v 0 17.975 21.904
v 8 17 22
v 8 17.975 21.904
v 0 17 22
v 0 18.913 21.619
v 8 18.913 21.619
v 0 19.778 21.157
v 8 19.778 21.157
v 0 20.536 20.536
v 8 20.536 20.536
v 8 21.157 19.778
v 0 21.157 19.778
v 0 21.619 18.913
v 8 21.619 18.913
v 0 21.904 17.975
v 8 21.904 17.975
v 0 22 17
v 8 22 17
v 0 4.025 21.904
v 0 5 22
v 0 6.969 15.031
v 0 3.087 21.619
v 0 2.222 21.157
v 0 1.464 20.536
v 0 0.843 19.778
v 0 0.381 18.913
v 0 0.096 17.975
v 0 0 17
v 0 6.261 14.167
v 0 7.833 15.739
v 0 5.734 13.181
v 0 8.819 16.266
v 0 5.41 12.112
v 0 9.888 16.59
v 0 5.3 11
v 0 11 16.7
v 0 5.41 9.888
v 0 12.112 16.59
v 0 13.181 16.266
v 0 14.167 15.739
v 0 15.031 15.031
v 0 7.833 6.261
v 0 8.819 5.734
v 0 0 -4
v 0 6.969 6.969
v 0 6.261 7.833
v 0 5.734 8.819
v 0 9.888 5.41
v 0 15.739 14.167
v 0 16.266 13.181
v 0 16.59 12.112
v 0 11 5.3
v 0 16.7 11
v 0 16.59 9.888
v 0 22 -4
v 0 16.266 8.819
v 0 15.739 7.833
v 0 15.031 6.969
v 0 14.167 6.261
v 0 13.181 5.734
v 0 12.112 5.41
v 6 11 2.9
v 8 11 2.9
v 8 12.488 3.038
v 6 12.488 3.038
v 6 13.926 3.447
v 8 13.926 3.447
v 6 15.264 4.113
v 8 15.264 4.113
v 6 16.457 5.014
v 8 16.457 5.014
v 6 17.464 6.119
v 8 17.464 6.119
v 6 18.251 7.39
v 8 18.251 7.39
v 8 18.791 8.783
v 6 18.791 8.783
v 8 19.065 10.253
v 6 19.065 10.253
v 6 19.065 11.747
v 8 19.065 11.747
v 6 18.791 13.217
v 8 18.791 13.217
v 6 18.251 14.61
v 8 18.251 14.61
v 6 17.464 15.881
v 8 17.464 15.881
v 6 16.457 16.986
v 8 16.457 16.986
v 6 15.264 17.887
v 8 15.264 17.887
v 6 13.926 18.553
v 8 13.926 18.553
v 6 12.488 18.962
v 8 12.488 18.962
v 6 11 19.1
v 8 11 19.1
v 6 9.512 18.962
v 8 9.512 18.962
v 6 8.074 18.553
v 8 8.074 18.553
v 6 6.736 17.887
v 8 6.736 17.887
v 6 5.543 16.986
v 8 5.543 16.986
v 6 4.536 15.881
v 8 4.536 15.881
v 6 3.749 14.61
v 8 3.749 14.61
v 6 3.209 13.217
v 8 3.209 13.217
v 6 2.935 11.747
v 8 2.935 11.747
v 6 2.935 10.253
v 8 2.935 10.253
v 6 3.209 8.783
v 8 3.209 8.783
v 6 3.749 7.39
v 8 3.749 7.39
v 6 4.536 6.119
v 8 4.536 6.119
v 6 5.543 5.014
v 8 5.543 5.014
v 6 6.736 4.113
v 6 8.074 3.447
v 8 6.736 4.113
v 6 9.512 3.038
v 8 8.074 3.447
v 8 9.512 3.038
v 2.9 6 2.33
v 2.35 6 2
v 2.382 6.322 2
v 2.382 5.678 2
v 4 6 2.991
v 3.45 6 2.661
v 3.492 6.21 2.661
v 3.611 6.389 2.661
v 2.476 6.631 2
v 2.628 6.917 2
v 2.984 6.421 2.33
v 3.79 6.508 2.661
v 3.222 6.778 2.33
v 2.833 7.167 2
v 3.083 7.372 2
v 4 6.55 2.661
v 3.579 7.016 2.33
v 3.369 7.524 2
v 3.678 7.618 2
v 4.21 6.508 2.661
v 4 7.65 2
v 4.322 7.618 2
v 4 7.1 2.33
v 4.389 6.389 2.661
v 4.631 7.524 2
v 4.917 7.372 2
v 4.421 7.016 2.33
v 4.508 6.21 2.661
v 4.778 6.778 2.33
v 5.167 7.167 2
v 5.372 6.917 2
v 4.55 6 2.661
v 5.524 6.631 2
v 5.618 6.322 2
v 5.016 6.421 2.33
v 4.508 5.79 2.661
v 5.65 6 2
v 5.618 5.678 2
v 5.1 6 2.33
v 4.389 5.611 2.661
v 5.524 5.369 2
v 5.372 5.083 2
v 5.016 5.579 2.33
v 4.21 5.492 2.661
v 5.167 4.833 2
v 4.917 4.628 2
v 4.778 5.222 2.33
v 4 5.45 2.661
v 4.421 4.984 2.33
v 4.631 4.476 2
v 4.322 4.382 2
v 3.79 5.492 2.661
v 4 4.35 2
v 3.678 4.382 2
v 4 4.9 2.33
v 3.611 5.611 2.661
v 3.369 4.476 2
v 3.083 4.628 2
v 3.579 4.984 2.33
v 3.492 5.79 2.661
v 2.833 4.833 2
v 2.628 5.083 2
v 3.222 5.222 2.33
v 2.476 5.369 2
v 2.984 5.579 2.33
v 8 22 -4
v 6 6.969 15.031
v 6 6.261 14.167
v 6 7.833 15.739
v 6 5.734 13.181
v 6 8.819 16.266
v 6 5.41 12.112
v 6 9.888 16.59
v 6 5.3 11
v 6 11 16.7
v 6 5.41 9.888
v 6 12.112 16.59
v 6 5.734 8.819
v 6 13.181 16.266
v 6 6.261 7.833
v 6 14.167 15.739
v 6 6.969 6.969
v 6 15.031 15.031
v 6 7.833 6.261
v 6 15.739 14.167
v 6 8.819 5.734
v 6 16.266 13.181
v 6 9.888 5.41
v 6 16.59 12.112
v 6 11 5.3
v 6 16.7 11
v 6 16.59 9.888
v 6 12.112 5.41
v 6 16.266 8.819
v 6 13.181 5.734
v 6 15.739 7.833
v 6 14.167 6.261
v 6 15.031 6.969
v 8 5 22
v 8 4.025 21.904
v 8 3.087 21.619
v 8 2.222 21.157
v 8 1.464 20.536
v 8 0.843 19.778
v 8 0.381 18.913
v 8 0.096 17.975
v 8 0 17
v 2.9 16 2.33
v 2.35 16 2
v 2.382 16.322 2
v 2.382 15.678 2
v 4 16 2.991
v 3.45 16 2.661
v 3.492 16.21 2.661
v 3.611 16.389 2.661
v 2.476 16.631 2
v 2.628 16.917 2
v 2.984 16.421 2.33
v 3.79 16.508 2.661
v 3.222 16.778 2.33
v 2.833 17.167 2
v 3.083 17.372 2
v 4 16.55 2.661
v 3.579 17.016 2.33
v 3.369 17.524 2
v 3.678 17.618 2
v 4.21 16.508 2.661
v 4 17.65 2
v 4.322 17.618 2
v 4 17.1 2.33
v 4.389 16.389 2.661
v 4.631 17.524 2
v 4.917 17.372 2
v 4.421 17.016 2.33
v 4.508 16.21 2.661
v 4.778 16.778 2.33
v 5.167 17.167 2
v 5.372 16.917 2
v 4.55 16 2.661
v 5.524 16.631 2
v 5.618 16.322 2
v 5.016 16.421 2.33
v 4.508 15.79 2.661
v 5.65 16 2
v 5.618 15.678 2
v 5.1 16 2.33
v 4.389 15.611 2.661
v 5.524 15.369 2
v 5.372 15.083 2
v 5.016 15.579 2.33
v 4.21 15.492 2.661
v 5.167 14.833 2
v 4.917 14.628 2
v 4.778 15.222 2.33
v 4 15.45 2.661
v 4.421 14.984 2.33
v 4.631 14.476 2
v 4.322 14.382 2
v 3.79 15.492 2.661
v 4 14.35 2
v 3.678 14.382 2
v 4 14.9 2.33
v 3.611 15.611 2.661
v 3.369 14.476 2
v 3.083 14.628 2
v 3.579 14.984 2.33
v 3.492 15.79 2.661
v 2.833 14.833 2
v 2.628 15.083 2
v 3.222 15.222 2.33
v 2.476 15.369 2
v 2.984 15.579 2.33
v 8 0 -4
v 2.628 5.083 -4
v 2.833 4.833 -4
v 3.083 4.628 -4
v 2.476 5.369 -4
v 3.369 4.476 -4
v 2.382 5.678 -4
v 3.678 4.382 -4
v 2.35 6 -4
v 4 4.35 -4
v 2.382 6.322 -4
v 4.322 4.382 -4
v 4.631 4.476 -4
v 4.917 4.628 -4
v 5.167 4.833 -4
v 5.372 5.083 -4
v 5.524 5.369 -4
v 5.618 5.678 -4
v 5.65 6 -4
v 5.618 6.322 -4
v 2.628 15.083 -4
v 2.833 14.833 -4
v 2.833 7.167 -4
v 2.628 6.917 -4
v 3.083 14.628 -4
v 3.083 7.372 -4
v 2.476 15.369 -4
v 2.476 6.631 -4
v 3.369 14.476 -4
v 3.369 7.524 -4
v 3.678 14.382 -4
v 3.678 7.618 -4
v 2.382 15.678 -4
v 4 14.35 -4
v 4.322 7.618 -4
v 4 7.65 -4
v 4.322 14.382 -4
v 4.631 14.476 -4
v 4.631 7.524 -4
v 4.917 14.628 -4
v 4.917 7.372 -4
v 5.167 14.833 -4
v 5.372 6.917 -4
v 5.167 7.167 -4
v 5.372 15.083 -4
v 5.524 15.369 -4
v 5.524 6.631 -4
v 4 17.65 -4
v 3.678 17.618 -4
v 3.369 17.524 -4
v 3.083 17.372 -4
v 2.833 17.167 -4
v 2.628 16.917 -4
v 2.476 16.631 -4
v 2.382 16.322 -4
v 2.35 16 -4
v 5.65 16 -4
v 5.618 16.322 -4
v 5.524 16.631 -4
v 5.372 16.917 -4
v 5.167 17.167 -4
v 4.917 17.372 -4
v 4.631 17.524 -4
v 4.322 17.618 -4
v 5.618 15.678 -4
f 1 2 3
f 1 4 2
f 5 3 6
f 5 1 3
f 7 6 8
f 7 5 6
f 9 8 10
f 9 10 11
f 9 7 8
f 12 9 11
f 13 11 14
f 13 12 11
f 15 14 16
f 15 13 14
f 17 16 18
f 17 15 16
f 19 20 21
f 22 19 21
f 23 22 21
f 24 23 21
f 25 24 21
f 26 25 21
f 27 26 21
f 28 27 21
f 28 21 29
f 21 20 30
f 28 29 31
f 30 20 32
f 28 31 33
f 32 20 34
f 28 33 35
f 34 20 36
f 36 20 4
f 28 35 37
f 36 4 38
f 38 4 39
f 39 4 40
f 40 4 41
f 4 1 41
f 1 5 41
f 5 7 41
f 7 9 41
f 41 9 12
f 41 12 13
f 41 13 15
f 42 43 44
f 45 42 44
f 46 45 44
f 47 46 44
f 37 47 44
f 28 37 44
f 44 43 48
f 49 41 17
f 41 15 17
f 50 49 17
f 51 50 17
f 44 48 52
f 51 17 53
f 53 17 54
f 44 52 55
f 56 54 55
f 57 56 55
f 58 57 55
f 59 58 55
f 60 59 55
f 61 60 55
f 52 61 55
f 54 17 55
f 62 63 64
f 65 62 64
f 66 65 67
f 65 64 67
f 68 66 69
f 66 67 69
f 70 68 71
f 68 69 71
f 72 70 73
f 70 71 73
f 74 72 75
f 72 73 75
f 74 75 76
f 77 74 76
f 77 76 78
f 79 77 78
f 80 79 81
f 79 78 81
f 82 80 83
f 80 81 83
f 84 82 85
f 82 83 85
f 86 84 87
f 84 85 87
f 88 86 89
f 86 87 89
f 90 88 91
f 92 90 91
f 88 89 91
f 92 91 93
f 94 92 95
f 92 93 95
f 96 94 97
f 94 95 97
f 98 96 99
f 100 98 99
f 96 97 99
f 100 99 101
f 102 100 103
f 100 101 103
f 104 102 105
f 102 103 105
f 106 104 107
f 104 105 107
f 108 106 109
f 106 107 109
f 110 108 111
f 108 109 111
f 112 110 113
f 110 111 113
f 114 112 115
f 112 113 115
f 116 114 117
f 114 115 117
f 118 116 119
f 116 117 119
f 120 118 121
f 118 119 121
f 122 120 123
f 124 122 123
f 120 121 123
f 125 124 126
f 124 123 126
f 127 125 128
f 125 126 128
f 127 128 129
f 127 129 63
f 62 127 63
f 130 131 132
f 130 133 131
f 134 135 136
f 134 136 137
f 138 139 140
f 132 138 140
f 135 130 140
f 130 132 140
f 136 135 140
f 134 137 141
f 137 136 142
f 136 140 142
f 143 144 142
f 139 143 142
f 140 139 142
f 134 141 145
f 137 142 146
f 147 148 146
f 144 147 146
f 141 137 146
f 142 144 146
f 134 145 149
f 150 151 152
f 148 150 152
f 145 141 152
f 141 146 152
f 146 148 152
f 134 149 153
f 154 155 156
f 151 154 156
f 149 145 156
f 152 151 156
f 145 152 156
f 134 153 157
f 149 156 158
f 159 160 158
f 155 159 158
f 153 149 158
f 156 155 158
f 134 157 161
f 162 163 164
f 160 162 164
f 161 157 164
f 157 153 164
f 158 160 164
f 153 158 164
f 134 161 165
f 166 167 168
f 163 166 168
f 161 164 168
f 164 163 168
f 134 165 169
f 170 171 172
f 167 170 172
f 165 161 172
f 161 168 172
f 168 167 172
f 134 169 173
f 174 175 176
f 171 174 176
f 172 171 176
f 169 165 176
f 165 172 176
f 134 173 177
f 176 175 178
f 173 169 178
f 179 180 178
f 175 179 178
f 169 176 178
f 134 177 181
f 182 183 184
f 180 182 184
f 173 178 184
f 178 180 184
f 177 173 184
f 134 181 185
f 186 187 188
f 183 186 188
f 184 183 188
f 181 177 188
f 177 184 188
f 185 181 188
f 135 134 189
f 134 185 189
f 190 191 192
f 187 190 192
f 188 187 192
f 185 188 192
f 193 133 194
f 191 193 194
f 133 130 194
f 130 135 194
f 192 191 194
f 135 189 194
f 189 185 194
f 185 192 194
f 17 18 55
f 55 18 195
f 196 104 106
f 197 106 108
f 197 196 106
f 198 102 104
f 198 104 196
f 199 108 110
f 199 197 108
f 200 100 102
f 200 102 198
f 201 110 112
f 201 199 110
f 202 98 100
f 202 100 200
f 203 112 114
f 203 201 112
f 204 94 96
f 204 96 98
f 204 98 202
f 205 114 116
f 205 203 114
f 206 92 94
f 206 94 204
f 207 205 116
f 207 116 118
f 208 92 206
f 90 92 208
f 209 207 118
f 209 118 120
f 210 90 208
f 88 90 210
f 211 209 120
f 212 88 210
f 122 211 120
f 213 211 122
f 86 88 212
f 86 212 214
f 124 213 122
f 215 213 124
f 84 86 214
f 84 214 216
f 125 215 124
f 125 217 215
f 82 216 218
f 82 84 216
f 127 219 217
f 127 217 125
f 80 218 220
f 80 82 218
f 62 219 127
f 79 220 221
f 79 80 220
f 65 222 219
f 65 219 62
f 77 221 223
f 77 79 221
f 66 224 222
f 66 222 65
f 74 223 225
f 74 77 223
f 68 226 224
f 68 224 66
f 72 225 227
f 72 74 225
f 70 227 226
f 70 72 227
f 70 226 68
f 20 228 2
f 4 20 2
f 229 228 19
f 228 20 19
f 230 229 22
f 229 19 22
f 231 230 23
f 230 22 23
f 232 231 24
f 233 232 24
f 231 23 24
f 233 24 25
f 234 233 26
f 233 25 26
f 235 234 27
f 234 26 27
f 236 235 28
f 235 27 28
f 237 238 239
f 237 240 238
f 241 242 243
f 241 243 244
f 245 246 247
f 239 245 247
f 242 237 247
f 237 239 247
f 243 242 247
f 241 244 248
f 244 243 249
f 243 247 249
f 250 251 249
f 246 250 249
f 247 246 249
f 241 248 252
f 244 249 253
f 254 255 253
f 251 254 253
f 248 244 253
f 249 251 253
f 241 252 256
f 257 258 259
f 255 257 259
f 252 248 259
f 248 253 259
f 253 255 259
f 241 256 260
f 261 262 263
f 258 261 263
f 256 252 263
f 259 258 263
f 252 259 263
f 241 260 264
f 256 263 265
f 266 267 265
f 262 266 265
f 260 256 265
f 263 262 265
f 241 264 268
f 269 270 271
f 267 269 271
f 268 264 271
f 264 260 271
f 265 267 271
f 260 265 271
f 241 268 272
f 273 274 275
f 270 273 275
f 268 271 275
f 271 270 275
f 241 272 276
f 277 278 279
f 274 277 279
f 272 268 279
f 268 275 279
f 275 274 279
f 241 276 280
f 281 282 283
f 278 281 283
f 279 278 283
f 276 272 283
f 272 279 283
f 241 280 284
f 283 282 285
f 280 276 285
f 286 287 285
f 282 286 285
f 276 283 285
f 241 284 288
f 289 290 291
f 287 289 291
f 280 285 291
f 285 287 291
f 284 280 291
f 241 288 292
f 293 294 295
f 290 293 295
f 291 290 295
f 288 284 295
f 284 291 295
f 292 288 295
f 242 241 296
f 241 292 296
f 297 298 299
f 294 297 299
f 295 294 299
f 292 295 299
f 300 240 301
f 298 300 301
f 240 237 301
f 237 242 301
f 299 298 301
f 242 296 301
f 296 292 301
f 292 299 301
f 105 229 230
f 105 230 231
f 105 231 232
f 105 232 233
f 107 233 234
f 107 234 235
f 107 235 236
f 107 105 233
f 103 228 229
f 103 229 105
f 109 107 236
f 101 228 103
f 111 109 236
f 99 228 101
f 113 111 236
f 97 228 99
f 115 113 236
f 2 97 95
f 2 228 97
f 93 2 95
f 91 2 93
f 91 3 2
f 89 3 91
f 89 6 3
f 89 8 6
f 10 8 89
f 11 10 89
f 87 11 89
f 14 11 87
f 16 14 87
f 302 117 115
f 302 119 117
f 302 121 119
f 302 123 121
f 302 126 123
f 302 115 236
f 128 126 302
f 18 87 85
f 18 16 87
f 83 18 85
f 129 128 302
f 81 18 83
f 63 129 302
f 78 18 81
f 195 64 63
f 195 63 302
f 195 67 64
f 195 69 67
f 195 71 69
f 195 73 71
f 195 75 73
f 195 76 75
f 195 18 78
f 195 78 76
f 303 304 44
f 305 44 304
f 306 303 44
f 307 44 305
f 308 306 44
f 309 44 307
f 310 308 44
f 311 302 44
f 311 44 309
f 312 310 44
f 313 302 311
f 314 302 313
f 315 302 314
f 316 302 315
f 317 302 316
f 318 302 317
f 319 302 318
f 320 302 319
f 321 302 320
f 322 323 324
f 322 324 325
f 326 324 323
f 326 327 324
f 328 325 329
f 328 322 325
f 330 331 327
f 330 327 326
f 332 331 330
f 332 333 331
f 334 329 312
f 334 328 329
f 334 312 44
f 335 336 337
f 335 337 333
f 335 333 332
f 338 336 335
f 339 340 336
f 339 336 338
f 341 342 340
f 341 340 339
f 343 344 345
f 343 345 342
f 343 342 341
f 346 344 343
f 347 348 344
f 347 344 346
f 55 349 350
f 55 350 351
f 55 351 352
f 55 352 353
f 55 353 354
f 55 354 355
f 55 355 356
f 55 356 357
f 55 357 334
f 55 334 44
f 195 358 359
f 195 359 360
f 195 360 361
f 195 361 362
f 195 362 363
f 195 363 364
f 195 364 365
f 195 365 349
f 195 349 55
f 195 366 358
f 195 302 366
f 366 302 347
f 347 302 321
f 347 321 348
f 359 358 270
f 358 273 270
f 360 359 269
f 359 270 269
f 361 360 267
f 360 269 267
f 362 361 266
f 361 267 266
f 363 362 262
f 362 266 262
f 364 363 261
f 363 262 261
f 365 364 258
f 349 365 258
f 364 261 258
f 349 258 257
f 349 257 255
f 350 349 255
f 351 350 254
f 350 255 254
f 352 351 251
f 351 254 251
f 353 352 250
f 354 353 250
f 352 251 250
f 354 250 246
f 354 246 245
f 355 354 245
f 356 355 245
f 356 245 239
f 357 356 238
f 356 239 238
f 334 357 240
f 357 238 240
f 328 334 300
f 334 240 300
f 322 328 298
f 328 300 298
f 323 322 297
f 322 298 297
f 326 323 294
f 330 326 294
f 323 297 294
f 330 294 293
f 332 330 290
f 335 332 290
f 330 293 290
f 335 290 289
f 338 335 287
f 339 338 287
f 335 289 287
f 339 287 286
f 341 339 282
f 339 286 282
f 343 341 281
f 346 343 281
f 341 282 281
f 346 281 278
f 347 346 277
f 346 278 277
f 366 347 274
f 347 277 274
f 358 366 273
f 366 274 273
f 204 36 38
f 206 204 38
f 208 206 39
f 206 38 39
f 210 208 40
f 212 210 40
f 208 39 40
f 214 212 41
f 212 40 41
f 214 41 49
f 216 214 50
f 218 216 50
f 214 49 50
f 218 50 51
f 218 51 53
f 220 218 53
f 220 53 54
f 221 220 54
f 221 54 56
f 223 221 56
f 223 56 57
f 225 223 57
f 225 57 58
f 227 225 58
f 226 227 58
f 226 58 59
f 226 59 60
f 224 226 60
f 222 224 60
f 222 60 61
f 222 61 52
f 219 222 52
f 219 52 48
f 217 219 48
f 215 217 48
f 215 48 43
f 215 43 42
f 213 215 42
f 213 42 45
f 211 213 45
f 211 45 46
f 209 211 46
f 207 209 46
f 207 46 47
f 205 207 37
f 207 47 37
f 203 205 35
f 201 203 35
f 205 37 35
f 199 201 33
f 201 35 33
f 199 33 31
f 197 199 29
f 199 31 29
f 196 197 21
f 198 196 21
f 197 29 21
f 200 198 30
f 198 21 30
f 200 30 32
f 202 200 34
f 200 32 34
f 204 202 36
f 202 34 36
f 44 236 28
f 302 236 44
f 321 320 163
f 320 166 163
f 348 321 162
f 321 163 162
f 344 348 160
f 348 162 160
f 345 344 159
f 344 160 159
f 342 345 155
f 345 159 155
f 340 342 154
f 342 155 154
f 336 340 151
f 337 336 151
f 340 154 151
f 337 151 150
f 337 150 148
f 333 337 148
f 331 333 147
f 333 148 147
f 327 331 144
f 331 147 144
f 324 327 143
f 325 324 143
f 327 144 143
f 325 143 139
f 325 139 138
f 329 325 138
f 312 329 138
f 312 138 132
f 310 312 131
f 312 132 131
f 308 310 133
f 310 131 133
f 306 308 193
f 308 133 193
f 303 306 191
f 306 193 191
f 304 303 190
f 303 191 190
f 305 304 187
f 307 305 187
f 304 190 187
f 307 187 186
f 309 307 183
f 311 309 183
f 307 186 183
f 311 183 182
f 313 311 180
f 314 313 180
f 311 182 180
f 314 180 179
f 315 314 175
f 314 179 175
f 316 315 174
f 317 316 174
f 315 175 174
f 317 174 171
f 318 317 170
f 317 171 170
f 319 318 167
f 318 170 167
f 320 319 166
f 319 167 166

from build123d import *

# Parameters (mm, degrees)
SKETCH1_W                      = 26
SKETCH1_H                      = 22
BOSS_EXTRUDE1_DEPTH            = 8
SKETCH2_R                      = 8.1
CUT_EXTRUDE1_DEPTH             = 2
F_3_3_3_3_DIAMETER_HOLE1_D     = 3.3
F_3_3_3_3_DIAMETER_HOLE1_DEPTH = 6
F_3_3_3_3_DIAMETER_HOLE1_TIP   = 0.991420021
M10_CLEARANCE_HOLE1_D          = 11.4
FILLET1_R                      = 5


with BuildPart() as part:
    # Sketch1 → Boss-Extrude1 (new body)
    with BuildSketch(Plane(origin=(8, 0, 0), x_dir=(0, 0, -1), z_dir=(1, 0, 0))):
        with Locations((-9, 11)):
            Rectangle(SKETCH1_W, SKETCH1_H)
    extrude(amount=-BOSS_EXTRUDE1_DEPTH)

    # Sketch2 → Cut-Extrude1 (cut)
    with BuildSketch(Plane(origin=(8, 0, 0), x_dir=(0, 0, -1), z_dir=(1, 0, 0))):
        with Locations((-11, 11)):
            Circle(SKETCH2_R)
    extrude(amount=-CUT_EXTRUDE1_DEPTH, mode=Mode.SUBTRACT)

    # Ø3.3 (3.3) Diameter Hole1
    with Locations(Plane(origin=(0, 0, -4), x_dir=(-1, 0, 0), z_dir=(0, 0, -1))):
        with Locations((-4, 16), (-4, 6)):
            Hole(F_3_3_3_3_DIAMETER_HOLE1_D / 2, depth=F_3_3_3_3_DIAMETER_HOLE1_DEPTH)
            with Locations((0, 0, -(F_3_3_3_3_DIAMETER_HOLE1_DEPTH + F_3_3_3_3_DIAMETER_HOLE1_TIP / 2))):  # 118° drill point
                Cone(0, F_3_3_3_3_DIAMETER_HOLE1_D / 2, F_3_3_3_3_DIAMETER_HOLE1_TIP, mode=Mode.SUBTRACT)

    # M10 Clearance Hole1 (through all)
    with Locations(Plane(origin=(6, 0, 0), x_dir=(0, 0, -1), z_dir=(1, 0, 0))):
        with Locations((-11, 11)):
            Hole(M10_CLEARANCE_HOLE1_D / 2)

    # Fillet1
    fillet1_edges = [part.edges().sort_by_distance(p)[0] for p in [
        (4, 0, 22),
        (4, 22, 22),
    ]]
    fillet(fillet1_edges, radius=FILLET1_R)


solid = part.part
